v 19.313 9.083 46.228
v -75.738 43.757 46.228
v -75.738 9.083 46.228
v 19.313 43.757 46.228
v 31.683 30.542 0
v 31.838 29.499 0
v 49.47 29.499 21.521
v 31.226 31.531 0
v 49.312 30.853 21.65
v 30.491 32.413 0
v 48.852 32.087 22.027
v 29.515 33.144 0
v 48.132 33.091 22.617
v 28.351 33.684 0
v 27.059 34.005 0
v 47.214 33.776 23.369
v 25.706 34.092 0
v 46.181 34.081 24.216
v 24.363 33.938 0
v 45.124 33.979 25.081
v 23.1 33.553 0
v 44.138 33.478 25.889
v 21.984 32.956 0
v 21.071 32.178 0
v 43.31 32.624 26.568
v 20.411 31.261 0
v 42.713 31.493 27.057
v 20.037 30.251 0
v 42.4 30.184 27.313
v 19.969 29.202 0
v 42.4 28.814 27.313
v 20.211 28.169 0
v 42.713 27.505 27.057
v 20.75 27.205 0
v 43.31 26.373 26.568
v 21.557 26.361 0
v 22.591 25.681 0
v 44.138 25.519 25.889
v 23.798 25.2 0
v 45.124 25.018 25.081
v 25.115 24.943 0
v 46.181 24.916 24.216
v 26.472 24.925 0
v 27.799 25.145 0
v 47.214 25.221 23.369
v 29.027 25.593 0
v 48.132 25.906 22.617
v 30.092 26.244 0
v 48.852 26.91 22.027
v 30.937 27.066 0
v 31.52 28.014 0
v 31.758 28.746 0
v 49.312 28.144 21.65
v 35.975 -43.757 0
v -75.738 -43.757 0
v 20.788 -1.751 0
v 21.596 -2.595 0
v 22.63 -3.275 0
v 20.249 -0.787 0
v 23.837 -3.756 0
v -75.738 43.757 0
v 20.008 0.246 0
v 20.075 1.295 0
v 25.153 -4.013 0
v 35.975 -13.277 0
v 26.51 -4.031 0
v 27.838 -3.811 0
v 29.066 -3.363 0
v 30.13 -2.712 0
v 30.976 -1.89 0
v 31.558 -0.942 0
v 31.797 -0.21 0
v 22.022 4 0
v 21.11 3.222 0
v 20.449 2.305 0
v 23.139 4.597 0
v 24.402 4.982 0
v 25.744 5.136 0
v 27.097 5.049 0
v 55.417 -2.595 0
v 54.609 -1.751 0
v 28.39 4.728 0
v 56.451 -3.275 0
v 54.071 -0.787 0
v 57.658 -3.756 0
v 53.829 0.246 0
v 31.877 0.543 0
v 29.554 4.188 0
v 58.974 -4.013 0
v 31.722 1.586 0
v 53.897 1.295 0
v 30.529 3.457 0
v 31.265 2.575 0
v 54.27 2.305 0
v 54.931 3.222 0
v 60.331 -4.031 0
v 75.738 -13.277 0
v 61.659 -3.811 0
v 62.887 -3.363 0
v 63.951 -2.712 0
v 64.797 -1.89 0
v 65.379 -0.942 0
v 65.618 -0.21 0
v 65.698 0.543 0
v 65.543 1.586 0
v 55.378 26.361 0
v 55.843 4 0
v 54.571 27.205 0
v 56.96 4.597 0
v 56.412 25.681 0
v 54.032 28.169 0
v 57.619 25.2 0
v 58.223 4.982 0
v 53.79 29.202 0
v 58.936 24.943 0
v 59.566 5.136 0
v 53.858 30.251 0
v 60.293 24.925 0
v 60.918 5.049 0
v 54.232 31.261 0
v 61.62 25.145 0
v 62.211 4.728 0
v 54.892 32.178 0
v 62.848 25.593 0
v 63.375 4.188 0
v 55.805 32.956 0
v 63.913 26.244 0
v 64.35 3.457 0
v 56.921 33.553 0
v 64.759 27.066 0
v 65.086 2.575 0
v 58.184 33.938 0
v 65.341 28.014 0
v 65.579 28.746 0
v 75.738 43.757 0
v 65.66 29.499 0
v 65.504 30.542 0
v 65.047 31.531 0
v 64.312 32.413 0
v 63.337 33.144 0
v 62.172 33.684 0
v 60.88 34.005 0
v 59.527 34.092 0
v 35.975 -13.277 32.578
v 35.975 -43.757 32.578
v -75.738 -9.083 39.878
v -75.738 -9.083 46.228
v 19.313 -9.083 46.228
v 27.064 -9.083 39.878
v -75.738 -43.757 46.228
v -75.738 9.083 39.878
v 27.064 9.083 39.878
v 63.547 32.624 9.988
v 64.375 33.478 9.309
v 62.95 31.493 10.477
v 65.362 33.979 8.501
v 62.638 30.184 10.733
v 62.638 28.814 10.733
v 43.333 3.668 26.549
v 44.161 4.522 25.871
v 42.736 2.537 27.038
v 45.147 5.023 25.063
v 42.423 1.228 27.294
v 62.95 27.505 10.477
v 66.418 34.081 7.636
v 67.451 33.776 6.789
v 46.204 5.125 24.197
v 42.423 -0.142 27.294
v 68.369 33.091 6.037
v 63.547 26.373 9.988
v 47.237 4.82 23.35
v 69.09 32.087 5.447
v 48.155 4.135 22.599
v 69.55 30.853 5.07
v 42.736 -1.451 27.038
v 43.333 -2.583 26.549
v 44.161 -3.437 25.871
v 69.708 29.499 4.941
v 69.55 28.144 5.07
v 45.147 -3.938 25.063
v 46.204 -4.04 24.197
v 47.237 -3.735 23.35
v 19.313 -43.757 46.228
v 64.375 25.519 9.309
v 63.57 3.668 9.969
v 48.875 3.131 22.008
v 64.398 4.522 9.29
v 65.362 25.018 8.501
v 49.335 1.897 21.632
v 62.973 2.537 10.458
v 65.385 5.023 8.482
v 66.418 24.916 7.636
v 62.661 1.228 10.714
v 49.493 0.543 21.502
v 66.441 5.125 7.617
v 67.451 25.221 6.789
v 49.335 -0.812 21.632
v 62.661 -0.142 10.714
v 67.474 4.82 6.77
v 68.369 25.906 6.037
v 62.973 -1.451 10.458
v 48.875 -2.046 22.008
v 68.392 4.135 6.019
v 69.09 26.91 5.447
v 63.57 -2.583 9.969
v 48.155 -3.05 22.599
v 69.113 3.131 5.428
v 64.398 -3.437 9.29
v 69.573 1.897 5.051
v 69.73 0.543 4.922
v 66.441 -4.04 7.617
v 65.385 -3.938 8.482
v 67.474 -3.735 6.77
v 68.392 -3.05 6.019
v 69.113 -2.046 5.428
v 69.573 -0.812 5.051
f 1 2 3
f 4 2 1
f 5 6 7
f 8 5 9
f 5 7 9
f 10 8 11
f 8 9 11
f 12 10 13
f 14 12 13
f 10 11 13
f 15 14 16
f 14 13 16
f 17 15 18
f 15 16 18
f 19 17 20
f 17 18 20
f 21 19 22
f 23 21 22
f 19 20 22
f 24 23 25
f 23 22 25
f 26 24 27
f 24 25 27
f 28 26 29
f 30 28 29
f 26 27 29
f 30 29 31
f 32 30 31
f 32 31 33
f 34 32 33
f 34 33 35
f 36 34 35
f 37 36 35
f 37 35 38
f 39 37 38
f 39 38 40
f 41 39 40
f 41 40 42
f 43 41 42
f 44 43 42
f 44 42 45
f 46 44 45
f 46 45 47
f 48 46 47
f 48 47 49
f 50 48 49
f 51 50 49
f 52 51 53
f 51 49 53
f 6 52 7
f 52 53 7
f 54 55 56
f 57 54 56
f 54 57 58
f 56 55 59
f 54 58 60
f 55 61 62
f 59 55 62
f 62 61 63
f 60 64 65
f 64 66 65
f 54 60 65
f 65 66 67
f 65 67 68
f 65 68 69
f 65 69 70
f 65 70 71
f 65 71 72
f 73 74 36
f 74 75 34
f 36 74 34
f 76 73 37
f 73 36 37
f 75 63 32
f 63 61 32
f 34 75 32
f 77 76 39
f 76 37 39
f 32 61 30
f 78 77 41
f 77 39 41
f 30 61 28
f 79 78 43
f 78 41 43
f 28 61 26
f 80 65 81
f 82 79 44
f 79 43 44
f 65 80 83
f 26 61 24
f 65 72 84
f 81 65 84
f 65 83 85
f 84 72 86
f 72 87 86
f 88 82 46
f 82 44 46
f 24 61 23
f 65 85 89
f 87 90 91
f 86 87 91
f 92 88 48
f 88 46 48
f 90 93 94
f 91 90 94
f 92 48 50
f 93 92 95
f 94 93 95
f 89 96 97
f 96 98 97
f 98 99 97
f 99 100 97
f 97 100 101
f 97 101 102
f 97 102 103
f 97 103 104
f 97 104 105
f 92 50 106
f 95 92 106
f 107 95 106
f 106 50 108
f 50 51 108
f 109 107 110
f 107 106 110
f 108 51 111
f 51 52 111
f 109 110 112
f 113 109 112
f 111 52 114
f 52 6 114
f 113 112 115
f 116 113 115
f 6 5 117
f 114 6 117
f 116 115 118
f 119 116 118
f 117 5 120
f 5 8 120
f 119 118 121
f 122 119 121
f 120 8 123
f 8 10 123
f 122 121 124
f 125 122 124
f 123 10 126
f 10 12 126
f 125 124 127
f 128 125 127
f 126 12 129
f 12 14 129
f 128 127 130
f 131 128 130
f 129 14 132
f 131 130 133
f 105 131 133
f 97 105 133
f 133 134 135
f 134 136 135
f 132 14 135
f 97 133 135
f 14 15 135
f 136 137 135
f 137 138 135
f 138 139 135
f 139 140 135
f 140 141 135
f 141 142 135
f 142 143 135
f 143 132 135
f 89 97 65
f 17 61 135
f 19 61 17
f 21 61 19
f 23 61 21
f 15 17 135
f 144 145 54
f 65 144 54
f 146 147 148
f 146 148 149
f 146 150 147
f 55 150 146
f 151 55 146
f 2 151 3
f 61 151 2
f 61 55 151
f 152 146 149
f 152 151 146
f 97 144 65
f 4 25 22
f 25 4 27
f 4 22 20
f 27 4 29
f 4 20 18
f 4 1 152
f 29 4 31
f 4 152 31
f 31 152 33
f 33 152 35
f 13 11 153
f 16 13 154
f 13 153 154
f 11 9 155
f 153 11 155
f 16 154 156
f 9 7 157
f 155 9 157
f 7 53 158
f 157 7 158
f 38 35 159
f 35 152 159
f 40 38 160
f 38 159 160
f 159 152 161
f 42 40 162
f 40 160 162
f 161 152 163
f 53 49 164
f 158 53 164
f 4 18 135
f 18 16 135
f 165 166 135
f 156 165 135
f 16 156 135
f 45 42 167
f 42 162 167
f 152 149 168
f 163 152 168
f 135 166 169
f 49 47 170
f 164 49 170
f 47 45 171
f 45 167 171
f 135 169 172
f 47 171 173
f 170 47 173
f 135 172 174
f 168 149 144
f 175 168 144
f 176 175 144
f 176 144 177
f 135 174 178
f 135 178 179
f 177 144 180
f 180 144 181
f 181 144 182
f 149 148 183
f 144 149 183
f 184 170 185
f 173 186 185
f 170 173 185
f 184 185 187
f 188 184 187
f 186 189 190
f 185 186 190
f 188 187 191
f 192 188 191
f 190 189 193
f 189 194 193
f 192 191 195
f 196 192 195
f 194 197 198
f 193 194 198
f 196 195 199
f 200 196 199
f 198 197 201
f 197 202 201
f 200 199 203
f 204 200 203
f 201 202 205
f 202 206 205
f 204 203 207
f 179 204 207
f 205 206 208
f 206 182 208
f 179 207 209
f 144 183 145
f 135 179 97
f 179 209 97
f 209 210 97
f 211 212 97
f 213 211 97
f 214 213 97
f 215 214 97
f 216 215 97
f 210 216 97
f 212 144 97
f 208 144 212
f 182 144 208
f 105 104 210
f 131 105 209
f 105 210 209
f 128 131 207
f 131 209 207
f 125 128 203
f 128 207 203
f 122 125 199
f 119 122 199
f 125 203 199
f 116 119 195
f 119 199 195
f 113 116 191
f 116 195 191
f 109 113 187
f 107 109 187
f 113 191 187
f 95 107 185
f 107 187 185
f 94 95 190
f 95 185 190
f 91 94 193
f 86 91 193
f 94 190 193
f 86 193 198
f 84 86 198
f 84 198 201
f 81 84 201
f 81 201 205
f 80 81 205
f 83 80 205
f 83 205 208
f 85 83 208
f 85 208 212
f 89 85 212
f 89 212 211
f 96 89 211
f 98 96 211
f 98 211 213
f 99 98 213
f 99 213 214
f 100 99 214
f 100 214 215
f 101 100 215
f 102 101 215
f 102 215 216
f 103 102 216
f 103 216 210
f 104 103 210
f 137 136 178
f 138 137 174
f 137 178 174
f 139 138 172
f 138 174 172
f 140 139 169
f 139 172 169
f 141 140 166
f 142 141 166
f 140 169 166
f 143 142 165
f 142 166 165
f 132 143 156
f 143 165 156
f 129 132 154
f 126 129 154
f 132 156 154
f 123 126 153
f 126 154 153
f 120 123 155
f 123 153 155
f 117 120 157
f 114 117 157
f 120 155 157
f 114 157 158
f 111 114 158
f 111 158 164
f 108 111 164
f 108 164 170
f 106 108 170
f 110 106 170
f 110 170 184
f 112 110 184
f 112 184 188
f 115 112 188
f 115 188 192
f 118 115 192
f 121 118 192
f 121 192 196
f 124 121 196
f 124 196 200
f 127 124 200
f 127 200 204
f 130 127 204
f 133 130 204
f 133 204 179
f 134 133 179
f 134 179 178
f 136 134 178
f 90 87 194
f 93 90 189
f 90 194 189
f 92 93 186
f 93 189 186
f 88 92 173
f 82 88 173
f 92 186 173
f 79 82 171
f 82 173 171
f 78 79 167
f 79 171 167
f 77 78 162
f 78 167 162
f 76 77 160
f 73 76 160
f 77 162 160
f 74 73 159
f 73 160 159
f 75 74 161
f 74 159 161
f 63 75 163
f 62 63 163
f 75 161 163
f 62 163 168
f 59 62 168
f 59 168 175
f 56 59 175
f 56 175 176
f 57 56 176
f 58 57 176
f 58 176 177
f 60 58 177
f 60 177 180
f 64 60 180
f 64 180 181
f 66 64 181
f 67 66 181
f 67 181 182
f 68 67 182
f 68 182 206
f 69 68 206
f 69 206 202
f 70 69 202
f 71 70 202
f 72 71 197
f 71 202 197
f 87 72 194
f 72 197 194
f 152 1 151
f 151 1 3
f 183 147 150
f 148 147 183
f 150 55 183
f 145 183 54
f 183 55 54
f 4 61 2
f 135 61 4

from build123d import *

# Parameters (mm, degrees)
F0_W     = 151.4763683081
F0_H     = 87.5145420432
F1_DEPTH = 46.228
F3_DEPTH = 102.87
F5_DEPTH = 30.48
F6_W     = 9.5930825919
F6_H     = 18.165897578
F6_W_2   = 95.0514208525
F7_DEPTH = 6.35
F8_R     = 4.5954023878
F9_DEPTH = 52.324


with BuildPart() as f1:
    # F0 (on Top) → F1 (new body)
    with BuildSketch(Plane.XY):
        Rectangle(F0_W, F0_H)
    extrude(amount=F1_DEPTH)

    # F2 (on face) → F3 (cut)
    with BuildSketch(Plane.XZ.offset(43.7572710216)):
        Polygon((75.738184154, 46.228), (19.3132366985, 46.228), (75.738184154, 0), align=None)
    extrude(amount=-F3_DEPTH, mode=Mode.SUBTRACT)

    # F4 (on face) → F5 (cut)
    with BuildSketch(Plane.XZ.offset(43.7572710216)):
        Polygon((75.738184154, 0), (35.9745252221, 32.5776896214), (35.9745252221, 0), align=None)
    extrude(amount=-F5_DEPTH, mode=Mode.SUBTRACT)

    # F6 (on face) → F7 (cut)
    with BuildSketch(Plane.XY.offset(46.228)):
        with Locations((24.1097779945, 0)):
            Rectangle(F6_W, F6_H)
        with Locations((-28.2124737278, 0)):
            Rectangle(F6_W_2, F6_H)
    extrude(amount=-F7_DEPTH, mode=Mode.SUBTRACT)

    # F8 (on face) → F9 (cut)
    with BuildSketch(Plane(origin=(30.4192109251, 0, 37.1290641622), x_dir=(0.7735396624, 0, -0.6337478921), z_dir=(0.6337478921, 0, 0.7735396624))):
        with Locations((20.0625781017, 0.542650738)):
            Circle(F8_R)
        with Locations((20.032882325, 29.4986355108)):
            Circle(F8_R)
        with Locations((46.194882325, 29.4986355108)):
            Circle(F8_R)
        with Locations((46.2245781017, 0.542650738)):
            Circle(F8_R)
    extrude(amount=-F9_DEPTH, mode=Mode.SUBTRACT)


solid = f1.part
